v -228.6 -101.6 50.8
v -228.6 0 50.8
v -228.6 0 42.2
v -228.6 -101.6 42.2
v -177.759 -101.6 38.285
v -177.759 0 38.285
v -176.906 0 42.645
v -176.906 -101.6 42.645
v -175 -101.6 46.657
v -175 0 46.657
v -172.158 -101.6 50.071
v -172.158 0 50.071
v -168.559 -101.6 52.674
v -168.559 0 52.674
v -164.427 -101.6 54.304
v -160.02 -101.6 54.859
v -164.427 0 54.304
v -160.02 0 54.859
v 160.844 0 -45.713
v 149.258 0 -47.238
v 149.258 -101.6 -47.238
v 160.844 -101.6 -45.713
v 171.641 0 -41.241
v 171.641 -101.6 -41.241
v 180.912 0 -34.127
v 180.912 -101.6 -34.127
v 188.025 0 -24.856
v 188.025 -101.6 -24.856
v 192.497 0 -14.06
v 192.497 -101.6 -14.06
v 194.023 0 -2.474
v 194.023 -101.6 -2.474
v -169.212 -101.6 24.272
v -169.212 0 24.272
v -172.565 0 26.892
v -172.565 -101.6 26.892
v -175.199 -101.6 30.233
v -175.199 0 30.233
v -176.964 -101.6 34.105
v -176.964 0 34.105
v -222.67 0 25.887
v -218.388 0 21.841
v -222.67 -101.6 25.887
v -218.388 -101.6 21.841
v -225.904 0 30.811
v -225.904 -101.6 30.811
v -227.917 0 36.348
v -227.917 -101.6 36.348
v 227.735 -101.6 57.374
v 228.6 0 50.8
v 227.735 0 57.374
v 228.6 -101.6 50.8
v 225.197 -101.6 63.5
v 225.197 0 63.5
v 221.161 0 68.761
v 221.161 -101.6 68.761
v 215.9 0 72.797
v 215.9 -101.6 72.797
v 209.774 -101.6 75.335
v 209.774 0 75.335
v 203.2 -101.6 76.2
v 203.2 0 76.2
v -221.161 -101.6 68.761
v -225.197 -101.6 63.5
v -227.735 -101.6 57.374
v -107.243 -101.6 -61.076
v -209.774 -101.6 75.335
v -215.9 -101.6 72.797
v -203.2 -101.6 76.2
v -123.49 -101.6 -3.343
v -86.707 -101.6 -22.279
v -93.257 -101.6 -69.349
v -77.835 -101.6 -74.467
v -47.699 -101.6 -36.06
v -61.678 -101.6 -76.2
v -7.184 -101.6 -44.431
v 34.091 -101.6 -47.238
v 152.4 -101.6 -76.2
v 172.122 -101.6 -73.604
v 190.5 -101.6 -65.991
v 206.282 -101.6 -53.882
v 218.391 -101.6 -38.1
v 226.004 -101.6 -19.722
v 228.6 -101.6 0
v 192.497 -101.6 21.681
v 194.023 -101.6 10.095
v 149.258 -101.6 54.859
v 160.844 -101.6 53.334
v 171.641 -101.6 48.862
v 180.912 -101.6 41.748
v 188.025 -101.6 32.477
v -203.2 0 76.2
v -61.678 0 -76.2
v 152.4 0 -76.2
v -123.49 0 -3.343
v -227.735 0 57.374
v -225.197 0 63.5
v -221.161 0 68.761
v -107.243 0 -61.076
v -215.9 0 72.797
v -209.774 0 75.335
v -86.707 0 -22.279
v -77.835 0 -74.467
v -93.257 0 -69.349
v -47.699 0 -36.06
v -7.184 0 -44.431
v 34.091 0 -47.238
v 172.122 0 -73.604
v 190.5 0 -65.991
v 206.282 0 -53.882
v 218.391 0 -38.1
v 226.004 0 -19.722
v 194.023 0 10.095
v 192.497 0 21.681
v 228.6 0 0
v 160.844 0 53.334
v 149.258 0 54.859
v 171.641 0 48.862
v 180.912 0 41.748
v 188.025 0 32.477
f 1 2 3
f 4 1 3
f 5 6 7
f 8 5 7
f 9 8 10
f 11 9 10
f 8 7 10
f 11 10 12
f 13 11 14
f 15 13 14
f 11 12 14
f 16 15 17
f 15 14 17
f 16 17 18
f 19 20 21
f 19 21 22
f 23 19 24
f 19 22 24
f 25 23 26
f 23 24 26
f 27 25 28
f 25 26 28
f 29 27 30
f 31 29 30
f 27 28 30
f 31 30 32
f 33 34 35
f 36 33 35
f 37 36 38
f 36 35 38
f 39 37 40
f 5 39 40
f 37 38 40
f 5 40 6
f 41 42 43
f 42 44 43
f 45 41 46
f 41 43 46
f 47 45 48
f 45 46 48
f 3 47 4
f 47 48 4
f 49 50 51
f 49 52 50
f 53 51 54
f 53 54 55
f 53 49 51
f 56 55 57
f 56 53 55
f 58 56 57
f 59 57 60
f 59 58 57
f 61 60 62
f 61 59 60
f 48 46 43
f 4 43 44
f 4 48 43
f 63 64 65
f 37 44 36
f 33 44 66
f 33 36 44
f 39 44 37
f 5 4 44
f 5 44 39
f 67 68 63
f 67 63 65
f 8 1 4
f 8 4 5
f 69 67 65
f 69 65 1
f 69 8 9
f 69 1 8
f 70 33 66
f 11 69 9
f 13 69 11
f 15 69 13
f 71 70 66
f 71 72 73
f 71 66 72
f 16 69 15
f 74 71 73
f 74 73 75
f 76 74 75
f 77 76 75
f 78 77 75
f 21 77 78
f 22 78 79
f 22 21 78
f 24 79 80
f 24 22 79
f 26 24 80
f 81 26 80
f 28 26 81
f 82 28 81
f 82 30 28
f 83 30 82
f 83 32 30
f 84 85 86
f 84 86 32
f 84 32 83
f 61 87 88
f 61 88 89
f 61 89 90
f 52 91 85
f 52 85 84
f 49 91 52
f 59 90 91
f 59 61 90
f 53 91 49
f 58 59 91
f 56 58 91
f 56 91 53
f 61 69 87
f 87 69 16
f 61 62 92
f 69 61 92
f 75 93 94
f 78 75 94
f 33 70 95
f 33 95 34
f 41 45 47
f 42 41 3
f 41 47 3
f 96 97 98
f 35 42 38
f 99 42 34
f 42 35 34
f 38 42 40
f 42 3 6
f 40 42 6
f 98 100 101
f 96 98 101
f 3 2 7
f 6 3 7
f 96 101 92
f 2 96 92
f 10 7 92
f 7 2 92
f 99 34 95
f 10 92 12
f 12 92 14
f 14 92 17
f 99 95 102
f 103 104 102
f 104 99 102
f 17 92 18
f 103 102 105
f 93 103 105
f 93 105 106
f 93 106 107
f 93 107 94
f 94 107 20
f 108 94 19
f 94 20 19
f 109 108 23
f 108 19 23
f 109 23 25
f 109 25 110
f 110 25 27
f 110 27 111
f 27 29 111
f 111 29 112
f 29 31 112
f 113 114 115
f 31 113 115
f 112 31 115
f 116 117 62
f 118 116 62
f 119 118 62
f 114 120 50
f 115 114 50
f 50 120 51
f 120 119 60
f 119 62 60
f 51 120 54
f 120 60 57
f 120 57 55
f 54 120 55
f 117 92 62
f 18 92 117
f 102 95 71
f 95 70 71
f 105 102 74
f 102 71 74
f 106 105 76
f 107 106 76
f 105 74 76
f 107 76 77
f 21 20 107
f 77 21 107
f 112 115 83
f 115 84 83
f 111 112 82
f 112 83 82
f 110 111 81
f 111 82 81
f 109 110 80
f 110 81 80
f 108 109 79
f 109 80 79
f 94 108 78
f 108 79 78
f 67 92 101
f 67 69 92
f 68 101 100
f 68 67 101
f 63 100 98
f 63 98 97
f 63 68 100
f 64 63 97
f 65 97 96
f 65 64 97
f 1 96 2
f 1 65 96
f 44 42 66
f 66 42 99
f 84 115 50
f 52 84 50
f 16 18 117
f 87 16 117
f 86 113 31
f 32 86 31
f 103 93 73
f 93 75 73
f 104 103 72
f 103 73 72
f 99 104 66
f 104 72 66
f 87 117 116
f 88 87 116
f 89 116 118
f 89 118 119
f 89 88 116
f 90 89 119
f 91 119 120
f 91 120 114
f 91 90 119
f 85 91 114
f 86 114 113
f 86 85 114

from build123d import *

# Parameters (mm, degrees)
F1_DEPTH    = 101.6
F2_R        = 25.4
F3_R        = 76.2
F4_R        = 25.4
F5_T1_DEPTH = 101.6
F6_R        = 44.7643478735
F7_R        = 304.8


# Not quite as in the source:
# - a fillet or chamfer that OpenCascade refuses, or shapes differently, is made with other operations: its cross-section is extruded or revolved along the edge and cut away or added


with BuildPart() as f1:
    # F0 (on Front) → F1 (new body)
    with BuildSketch(Plane.XZ):
        Polygon((228.6, -76.2), (228.6, 76.2), (-228.6, 76.2), (-228.6, 29.4590149546), (-86.9704671455, -76.2), align=None)
        Polygon((-50.8129218496, -47.2383520842), (-177.8, 29.4590149546), (-177.8, 54.8590149546), (194.0227749825, 54.8590149546), (194.0227749825, -47.2383520842), align=None, mode=Mode.SUBTRACT)
    extrude(amount=F1_DEPTH)

    # F2
    f2_edges = [f1.edges().sort_by_distance(p)[0] for p in [
        (-228.6, -50.8, 76.2),
        (-228.6, -50.8, 29.459015),
    ]]
    fillet(f2_edges, radius=F2_R)

    # F3
    f3_edges = [f1.edges().sort_by_distance(p)[0] for p in [
        (-86.970467, -50.8, -76.2),
        (228.6, -50.8, -76.2),
    ]]
    fillet(f3_edges, radius=F3_R)

    # F4
    f4_edges = [f1.edges().sort_by_distance(p)[0] for p in [
        (228.6, -50.8, 76.2),
    ]]
    fillet(f4_edges, radius=F4_R)

    # F5: fillet of radius 17.78 on 2 edges, made by hand

    # F5_s2 → F5_t1 (join)
    with BuildSketch(Plane.XZ):
        with BuildLine():
            ThreePointArc((-169.2122093999, 24.2721806932), (-175.5049262693, 30.7540427919), (-177.8, 39.4916316146))
            Line((-177.8, 39.4916316146), (-177.8, 29.4590149546))
            Line((-177.8, 29.4590149546), (-169.2122093999, 24.2721806932))
        make_face()
        with BuildLine():
            ThreePointArc((-177.8, 37.0790149546), (-172.5923585695, 49.6513735241), (-160.02, 54.8590149546))
            Line((-160.02, 54.8590149546), (-177.8, 54.8590149546))
            Line((-177.8, 54.8590149546), (-177.8, 37.0790149546))
        make_face()
    extrude(amount=F5_T1_DEPTH)

    # F6
    f6_edges = [f1.edges().sort_by_distance(p)[0] for p in [
        (194.022775, -50.8, -47.238352),
        (194.022775, -50.8, 54.859015),
    ]]
    fillet(f6_edges, radius=F6_R)

    # F7
    f7_edges = [f1.edges().sort_by_distance(p)[0] for p in [
        (-50.812922, -50.8, -47.238352),
    ]]
    fillet(f7_edges, radius=F7_R)


solid = f1.part
